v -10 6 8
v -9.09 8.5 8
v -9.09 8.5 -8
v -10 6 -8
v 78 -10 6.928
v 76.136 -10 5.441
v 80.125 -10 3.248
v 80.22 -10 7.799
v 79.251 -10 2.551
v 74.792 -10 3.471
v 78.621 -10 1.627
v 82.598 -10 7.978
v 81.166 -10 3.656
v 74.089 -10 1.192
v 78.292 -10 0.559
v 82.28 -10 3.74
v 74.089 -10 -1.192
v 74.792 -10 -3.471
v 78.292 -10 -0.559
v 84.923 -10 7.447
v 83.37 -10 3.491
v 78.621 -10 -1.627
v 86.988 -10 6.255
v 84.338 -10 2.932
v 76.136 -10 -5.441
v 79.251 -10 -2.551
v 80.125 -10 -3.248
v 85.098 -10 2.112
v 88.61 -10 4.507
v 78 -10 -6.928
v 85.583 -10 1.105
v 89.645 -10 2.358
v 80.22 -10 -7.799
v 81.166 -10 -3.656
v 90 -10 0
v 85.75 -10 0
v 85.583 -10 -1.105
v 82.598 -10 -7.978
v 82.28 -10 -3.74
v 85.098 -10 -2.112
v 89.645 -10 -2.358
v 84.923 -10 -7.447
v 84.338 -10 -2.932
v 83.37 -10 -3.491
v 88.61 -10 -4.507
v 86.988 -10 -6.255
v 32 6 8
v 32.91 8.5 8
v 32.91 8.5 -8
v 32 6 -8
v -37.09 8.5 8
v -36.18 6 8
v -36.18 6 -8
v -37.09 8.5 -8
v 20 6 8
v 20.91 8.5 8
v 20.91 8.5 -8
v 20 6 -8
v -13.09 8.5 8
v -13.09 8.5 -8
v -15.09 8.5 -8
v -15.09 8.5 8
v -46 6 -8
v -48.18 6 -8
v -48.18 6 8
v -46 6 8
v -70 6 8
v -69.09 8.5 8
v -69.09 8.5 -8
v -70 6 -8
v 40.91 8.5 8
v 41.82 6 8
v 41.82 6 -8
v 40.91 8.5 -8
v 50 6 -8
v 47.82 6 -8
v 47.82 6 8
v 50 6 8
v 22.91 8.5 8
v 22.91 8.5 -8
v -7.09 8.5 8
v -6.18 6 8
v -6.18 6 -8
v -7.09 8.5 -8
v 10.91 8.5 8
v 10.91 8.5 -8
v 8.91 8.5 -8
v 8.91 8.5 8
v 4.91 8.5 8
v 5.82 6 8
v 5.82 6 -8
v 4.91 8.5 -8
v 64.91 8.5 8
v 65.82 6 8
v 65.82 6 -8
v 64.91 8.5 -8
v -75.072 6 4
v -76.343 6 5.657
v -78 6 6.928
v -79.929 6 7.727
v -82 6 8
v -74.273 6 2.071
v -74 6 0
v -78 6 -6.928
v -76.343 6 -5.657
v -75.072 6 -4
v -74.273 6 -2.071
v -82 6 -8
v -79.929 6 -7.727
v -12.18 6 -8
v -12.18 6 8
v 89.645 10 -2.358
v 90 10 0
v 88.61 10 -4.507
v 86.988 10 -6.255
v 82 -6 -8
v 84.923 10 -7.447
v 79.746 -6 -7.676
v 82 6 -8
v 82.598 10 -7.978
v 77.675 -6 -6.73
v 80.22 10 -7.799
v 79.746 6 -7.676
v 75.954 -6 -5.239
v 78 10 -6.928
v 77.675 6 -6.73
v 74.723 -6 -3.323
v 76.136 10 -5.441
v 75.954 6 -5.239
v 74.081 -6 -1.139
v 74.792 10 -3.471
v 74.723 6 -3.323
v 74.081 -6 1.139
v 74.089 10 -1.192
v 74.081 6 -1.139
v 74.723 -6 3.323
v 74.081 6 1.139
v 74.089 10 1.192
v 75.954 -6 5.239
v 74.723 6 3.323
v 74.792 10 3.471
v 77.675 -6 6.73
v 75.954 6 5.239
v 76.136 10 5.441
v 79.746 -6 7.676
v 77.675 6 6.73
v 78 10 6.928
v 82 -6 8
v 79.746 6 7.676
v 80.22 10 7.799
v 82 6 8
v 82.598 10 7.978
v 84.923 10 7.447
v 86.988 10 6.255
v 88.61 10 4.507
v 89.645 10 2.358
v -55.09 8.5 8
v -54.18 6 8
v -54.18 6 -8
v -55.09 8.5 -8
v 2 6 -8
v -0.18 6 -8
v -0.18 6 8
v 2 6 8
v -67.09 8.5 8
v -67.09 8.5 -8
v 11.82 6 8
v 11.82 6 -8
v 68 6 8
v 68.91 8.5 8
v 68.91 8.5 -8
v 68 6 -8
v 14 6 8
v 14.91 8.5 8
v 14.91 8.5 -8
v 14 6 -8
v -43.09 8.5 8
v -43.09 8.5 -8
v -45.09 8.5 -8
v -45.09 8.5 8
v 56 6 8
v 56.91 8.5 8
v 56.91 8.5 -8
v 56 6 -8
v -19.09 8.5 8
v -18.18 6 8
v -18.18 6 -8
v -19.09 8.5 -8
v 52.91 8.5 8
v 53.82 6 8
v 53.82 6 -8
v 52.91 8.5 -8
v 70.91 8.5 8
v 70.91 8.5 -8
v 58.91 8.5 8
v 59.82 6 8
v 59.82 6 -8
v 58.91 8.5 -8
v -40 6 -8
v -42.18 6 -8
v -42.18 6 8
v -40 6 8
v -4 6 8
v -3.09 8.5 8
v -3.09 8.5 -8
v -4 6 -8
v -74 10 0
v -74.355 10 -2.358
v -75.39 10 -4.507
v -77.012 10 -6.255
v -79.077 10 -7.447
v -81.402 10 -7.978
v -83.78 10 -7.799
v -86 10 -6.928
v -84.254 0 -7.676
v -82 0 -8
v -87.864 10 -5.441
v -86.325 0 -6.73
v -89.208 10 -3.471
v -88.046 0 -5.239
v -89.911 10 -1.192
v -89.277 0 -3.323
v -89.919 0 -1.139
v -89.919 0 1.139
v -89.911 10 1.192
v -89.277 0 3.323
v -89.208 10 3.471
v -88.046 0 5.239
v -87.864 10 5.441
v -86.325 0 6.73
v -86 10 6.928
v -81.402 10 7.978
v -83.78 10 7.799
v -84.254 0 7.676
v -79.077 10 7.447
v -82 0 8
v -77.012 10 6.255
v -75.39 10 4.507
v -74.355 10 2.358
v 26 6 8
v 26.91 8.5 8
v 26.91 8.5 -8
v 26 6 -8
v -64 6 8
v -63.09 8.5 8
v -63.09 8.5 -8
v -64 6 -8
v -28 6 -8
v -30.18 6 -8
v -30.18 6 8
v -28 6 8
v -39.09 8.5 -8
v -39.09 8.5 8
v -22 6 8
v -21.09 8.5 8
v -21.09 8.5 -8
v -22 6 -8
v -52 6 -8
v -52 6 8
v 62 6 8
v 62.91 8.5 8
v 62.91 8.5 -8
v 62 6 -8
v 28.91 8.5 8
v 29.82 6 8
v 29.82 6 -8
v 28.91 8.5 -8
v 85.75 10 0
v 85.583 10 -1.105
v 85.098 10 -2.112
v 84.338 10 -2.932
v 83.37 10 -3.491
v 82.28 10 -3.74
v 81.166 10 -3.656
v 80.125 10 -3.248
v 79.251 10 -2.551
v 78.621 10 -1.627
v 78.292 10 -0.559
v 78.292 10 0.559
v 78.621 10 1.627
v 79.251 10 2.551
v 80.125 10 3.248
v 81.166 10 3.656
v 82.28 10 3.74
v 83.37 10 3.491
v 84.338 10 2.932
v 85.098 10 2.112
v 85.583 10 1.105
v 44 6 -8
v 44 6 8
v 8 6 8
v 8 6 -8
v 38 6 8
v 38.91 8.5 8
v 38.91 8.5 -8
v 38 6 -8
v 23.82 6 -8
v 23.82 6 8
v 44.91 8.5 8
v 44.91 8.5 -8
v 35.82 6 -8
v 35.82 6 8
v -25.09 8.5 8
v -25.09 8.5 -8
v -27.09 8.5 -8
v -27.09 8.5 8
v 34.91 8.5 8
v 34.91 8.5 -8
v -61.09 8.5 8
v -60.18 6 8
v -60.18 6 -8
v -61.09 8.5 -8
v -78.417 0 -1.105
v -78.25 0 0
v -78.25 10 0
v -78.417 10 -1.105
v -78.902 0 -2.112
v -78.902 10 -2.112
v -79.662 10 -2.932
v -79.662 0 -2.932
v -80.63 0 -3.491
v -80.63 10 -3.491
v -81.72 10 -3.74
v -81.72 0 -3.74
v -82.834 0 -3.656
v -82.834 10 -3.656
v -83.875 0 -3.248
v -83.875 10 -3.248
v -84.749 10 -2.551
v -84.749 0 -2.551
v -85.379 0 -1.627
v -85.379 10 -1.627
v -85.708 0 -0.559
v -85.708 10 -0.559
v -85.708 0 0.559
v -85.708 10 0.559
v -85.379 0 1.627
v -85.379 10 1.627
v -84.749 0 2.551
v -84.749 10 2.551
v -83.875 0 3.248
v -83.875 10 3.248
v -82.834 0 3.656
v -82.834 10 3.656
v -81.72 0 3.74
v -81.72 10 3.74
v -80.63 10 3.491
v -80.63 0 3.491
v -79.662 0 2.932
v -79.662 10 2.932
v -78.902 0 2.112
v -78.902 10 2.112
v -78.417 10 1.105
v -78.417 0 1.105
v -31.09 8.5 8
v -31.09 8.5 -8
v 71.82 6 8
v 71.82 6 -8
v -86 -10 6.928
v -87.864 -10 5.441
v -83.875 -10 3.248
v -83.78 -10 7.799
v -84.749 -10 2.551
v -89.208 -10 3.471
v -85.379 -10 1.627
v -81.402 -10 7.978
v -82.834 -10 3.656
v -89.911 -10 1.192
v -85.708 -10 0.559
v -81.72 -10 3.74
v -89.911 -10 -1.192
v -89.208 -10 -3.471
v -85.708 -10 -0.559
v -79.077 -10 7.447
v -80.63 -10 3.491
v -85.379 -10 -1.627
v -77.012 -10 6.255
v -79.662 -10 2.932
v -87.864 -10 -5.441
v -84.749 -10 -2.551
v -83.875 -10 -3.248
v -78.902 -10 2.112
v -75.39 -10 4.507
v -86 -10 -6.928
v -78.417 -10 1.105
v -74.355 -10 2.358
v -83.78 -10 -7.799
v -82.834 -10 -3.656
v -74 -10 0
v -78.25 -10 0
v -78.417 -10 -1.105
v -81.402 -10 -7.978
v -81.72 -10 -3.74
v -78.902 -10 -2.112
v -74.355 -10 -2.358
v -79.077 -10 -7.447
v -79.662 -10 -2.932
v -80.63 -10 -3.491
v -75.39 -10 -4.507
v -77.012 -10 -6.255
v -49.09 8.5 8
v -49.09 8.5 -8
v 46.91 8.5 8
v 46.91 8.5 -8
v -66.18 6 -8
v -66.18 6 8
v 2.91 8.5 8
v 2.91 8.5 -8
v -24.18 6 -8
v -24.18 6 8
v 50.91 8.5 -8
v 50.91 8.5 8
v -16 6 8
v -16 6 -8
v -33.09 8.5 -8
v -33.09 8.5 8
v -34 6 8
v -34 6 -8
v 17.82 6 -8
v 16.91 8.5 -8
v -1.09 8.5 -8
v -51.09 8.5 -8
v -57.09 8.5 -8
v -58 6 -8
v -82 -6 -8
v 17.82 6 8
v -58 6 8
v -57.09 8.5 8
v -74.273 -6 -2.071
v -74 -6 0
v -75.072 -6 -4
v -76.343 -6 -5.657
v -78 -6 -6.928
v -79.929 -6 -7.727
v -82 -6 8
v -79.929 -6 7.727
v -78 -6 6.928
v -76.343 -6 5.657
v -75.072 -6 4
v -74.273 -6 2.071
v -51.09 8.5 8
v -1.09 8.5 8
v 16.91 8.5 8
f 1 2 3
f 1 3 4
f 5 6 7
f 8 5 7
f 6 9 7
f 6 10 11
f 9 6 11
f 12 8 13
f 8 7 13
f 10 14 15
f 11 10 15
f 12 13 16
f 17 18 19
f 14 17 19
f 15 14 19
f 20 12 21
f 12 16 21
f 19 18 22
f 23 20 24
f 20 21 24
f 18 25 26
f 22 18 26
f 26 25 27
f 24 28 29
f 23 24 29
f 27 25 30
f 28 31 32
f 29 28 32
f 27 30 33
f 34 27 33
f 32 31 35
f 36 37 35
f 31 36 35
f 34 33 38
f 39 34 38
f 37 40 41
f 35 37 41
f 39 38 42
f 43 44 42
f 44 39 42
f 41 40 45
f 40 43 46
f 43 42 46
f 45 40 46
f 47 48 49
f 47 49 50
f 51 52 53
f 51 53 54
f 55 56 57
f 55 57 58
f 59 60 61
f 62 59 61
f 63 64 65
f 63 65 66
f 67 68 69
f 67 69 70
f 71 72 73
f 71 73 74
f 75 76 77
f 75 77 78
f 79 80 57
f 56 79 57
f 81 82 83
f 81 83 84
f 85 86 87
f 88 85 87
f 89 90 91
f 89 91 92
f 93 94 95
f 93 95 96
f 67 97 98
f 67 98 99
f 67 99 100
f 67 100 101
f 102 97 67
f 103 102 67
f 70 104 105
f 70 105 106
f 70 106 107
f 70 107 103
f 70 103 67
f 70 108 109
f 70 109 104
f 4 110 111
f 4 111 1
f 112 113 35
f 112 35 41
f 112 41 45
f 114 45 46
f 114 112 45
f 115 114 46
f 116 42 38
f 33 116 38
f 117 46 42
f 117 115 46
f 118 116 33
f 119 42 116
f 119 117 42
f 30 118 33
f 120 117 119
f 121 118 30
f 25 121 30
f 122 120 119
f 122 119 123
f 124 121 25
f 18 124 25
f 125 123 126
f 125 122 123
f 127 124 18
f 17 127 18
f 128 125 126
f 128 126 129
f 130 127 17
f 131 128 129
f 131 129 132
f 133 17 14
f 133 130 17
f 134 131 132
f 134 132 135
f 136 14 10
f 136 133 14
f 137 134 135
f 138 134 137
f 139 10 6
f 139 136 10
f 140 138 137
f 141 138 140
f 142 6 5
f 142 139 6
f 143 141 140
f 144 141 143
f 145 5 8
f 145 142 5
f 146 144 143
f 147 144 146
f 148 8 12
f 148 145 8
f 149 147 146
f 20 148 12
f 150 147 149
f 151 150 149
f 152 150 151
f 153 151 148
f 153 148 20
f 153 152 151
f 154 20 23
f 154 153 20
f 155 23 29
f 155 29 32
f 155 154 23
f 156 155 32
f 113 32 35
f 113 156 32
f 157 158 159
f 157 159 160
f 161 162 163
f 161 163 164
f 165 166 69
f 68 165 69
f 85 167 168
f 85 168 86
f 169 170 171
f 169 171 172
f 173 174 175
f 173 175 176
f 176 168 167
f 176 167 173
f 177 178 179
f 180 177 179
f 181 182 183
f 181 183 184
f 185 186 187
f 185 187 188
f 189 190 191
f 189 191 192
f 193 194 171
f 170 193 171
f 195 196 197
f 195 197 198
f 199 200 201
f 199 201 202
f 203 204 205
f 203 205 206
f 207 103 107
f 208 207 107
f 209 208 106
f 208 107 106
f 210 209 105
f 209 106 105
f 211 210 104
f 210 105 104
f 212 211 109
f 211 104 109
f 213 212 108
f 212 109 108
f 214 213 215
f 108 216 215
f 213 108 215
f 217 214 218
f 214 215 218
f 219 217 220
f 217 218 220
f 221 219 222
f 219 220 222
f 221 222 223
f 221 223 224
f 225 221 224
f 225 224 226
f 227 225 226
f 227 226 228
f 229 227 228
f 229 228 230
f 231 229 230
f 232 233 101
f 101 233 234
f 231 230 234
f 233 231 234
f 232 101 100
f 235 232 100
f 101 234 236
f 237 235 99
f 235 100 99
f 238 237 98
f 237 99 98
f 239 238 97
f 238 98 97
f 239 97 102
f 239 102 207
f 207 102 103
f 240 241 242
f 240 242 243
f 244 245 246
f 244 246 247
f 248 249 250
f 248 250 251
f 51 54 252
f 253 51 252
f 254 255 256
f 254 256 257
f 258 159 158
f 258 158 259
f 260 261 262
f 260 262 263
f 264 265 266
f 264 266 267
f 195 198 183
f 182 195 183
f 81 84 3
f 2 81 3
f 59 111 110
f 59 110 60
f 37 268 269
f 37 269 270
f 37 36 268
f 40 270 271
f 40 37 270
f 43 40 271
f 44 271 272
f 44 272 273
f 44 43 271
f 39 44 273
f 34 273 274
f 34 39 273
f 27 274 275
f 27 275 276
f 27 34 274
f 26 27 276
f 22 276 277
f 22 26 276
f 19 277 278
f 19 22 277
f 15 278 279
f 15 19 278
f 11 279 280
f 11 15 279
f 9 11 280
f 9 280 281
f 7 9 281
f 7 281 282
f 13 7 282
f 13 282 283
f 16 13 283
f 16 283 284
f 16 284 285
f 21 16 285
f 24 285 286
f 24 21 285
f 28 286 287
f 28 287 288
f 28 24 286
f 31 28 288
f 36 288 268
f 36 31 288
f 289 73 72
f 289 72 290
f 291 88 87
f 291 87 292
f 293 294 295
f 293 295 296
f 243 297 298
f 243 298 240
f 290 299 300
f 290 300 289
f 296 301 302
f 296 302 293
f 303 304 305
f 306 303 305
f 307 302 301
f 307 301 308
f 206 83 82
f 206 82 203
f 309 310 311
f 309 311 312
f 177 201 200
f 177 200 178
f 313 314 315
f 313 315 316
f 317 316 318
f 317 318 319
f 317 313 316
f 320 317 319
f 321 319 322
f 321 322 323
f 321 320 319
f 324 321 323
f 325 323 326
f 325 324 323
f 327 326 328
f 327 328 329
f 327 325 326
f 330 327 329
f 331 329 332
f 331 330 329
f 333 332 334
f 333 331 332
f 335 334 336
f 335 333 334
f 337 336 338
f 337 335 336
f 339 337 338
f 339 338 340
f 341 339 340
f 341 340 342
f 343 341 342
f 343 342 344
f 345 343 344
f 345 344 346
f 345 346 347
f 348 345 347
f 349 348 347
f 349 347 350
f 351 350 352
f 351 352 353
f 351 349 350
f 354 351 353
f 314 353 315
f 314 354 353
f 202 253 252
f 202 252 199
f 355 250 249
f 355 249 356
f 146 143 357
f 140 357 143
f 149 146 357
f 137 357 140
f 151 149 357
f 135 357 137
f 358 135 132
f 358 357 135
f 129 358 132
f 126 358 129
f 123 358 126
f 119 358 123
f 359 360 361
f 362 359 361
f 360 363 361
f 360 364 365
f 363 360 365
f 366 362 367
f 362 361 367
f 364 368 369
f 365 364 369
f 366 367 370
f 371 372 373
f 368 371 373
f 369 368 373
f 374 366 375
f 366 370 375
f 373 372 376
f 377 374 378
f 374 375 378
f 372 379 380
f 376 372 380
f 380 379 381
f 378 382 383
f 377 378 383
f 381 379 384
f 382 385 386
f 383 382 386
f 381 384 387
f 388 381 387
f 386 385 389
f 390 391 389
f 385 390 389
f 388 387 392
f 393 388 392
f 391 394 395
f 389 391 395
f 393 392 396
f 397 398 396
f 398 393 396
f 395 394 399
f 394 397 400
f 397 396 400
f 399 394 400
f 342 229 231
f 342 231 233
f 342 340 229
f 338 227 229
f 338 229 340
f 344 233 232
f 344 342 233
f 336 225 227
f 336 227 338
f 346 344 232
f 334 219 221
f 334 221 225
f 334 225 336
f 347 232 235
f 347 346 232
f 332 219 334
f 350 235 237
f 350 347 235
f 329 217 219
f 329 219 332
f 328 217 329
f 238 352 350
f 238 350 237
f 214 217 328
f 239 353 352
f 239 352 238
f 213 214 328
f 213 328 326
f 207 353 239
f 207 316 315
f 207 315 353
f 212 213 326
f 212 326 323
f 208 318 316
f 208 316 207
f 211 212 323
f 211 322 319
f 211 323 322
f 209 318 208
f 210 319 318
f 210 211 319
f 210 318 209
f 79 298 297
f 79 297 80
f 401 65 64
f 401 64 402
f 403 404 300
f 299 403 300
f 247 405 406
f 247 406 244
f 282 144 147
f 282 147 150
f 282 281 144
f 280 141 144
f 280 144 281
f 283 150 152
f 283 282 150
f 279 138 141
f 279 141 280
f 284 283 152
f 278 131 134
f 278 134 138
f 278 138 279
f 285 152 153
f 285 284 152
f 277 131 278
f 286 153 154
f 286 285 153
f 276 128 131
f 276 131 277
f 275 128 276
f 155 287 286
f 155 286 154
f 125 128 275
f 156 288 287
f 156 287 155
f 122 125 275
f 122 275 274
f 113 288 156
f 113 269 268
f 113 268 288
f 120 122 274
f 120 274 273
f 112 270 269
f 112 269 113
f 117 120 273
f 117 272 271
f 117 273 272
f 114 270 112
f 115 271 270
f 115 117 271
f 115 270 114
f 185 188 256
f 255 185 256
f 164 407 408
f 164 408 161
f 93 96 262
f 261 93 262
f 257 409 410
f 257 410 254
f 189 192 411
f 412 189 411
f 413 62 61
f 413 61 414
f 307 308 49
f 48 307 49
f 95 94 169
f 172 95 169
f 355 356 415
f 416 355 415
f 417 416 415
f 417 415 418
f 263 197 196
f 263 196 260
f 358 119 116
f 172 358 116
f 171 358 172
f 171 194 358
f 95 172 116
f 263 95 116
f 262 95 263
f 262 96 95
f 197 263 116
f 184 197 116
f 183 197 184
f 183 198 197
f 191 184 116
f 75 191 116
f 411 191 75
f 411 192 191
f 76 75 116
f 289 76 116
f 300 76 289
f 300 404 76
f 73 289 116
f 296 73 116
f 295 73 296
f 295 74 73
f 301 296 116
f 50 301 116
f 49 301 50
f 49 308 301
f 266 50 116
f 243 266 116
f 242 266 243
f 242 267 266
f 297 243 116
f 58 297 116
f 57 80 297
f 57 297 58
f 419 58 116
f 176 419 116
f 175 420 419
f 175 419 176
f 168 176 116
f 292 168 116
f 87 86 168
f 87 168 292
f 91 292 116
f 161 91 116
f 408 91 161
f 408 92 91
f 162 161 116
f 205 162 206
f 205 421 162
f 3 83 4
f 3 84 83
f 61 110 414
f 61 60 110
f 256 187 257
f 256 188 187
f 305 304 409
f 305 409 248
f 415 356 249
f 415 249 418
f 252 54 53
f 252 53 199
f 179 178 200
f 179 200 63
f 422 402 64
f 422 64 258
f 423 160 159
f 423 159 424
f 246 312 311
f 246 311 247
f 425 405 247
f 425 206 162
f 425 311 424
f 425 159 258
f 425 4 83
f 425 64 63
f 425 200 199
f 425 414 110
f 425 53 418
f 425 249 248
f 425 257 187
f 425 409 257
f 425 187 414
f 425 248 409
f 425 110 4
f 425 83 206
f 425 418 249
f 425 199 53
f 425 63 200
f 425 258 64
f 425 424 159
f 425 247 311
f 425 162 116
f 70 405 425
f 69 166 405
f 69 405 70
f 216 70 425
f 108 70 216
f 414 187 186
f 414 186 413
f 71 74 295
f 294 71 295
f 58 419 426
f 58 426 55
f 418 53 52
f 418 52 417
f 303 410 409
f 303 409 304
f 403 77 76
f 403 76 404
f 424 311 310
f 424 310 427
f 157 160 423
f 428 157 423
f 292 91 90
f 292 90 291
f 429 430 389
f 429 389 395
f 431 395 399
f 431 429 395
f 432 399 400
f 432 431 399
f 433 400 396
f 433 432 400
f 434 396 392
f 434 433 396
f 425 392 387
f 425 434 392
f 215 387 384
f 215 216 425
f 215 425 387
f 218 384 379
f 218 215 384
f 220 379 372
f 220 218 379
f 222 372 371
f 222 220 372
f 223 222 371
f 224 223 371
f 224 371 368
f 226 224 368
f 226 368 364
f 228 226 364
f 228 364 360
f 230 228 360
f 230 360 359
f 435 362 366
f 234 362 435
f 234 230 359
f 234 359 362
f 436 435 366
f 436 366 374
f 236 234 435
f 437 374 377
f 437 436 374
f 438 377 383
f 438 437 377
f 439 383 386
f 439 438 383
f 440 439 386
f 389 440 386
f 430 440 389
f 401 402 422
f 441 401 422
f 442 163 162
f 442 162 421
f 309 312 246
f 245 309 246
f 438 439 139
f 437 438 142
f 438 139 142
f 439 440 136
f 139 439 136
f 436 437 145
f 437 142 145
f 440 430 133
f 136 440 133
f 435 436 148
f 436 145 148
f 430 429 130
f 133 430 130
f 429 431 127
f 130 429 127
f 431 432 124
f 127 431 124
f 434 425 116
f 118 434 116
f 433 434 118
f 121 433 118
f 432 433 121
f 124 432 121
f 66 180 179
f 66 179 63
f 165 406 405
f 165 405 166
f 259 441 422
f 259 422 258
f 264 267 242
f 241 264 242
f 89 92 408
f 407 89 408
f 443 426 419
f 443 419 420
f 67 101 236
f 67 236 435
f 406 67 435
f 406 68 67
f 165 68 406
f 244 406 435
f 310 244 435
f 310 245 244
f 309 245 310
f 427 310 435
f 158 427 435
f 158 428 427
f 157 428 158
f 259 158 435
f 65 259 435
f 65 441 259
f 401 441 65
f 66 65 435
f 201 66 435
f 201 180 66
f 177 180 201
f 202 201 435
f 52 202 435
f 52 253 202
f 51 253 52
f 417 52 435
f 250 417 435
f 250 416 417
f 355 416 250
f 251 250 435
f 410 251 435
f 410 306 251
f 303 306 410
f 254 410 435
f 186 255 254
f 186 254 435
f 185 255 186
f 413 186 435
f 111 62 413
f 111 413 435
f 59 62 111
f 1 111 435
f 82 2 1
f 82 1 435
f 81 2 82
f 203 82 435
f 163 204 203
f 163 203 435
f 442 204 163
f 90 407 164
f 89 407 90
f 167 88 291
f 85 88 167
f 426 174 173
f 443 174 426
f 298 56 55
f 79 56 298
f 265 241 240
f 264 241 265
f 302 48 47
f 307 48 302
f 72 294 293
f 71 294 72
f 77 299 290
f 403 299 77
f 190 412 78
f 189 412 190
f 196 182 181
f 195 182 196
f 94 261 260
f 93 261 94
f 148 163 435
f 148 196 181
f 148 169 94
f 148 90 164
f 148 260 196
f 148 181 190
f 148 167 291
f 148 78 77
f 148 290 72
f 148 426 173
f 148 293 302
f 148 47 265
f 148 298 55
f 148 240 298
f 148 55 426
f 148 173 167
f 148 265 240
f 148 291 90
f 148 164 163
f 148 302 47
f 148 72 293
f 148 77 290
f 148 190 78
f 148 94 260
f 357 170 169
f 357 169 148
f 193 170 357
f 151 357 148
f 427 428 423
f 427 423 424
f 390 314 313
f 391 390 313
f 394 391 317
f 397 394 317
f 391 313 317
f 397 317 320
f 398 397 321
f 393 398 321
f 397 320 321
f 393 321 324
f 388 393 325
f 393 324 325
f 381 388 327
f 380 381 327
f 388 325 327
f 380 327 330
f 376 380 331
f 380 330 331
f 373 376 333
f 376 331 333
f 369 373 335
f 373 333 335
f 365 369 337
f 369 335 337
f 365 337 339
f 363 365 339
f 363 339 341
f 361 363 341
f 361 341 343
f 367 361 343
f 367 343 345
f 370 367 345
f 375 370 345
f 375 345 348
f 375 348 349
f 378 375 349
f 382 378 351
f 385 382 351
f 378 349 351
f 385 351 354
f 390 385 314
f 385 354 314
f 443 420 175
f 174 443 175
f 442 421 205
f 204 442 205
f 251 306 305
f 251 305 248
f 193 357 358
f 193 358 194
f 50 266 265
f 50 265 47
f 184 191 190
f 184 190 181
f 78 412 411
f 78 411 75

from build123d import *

# Parameters (mm, degrees)
BOSS_EXTRUDE1_DEPTH = 6
SKETCH1_3_R         = 8
SKETCH1_3_R_2       = 3.75
BOSS_EXTRUDE2_DEPTH = 10
BOSS_EXTRUDE3_DEPTH = 16


with BuildPart() as part:
    # Sketch1 → Boss-Extrude1 (new, symmetric)
    with BuildSketch(Plane(origin=(0, 0, 0), x_dir=(1, 0, 0), z_dir=(0, 1, 0))):
        with BuildLine():
            Line((82, 8), (-82, 8))
            ThreePointArc((-82, 8), (-76.343145751, 5.656854249), (-74, 0))
            ThreePointArc((-74, 0), (-76.343145751, -5.656854249), (-82, -8))
            Line((-82, -8), (82, -8))
            ThreePointArc((82, -8), (74, 0), (82, 8))
        make_face()
    extrude(amount=BOSS_EXTRUDE1_DEPTH, both=True)

    # Sketch1<3> → Boss-Extrude2 (add, symmetric)
    # profile 1 of 2: a face of its own
    with BuildSketch(Plane(origin=(0, 0, 0), x_dir=(1, 0, 0), z_dir=(0, 1, 0))):
        with Locations((-82, 0)):
            Circle(SKETCH1_3_R)
        with Locations((-82, 0)):
            Circle(SKETCH1_3_R_2, mode=Mode.SUBTRACT)
    # profile 2 of 2: a face of its own
    with BuildSketch(Plane(origin=(0, 0, 0), x_dir=(1, 0, 0), z_dir=(0, 1, 0))):
        with Locations((82, 0)):
            Circle(SKETCH1_3_R)
        with Locations((82, 0)):
            Circle(SKETCH1_3_R_2, mode=Mode.SUBTRACT)
    extrude(amount=BOSS_EXTRUDE2_DEPTH, both=True)

    # Sketch2 → Boss-Extrude3 (add)
    with BuildSketch(Plane.XY.offset(8)):
        Polygon((71.819851171, 6), (70.909925586, 8.5), (68.909925586, 8.5), (68, 6), align=None)
        Polygon((65.819851171, 6), (64.909925586, 8.5), (62.909925586, 8.5), (62, 6), align=None)
        Polygon((59.819851171, 6), (58.909925586, 8.5), (56.909925586, 8.5), (56, 6), align=None)
        Polygon((53.819851171, 6), (52.909925586, 8.5), (50.909925586, 8.5), (50, 6), align=None)
        Polygon((47.819851171, 6), (46.909925586, 8.5), (44.909925586, 8.5), (44, 6), align=None)
        Polygon((41.819851171, 6), (40.909925586, 8.5), (38.909925586, 8.5), (38, 6), align=None)
        Polygon((35.819851171, 6), (34.909925586, 8.5), (32.909925586, 8.5), (32, 6), align=None)
        Polygon((29.819851171, 6), (28.909925586, 8.5), (26.909925586, 8.5), (26, 6), align=None)
        Polygon((23.819851171, 6), (22.909925586, 8.5), (20.909925586, 8.5), (20, 6), align=None)
        Polygon((17.819851171, 6), (16.909925586, 8.5), (14.909925586, 8.5), (14, 6), align=None)
        Polygon((11.819851171, 6), (10.909925586, 8.5), (8.909925586, 8.5), (8, 6), align=None)
        Polygon((5.819851171, 6), (4.909925586, 8.5), (2.909925586, 8.5), (2, 6), align=None)
        Polygon((-0.180148829, 6), (-1.090074414, 8.5), (-3.090074414, 8.5), (-4, 6), align=None)
        Polygon((-6.180148829, 6), (-7.090074414, 8.5), (-9.090074414, 8.5), (-10, 6), align=None)
        Polygon((-12.180148829, 6), (-13.090074414, 8.5), (-15.090074414, 8.5), (-16, 6), align=None)
        Polygon((-18.180148829, 6), (-19.090074414, 8.5), (-21.090074414, 8.5), (-22, 6), align=None)
        Polygon((-24.180148829, 6), (-25.090074414, 8.5), (-27.090074414, 8.5), (-28, 6), align=None)
        Polygon((-30.180148829, 6), (-31.090074414, 8.5), (-33.090074414, 8.5), (-34, 6), align=None)
        Polygon((-36.180148829, 6), (-37.090074414, 8.5), (-39.090074414, 8.5), (-40, 6), align=None)
        Polygon((-42.180148829, 6), (-43.090074414, 8.5), (-45.090074414, 8.5), (-46, 6), align=None)
        Polygon((-48.180148829, 6), (-49.090074414, 8.5), (-51.090074414, 8.5), (-52, 6), align=None)
        Polygon((-54.180148829, 6), (-55.090074414, 8.5), (-57.090074414, 8.5), (-58, 6), align=None)
        Polygon((-60.180148829, 6), (-61.090074414, 8.5), (-63.090074414, 8.5), (-64, 6), align=None)
        Polygon((-66.180148829, 6), (-67.090074414, 8.5), (-69.090074414, 8.5), (-70, 6), align=None)
    extrude(amount=-BOSS_EXTRUDE3_DEPTH)


solid = part.part
